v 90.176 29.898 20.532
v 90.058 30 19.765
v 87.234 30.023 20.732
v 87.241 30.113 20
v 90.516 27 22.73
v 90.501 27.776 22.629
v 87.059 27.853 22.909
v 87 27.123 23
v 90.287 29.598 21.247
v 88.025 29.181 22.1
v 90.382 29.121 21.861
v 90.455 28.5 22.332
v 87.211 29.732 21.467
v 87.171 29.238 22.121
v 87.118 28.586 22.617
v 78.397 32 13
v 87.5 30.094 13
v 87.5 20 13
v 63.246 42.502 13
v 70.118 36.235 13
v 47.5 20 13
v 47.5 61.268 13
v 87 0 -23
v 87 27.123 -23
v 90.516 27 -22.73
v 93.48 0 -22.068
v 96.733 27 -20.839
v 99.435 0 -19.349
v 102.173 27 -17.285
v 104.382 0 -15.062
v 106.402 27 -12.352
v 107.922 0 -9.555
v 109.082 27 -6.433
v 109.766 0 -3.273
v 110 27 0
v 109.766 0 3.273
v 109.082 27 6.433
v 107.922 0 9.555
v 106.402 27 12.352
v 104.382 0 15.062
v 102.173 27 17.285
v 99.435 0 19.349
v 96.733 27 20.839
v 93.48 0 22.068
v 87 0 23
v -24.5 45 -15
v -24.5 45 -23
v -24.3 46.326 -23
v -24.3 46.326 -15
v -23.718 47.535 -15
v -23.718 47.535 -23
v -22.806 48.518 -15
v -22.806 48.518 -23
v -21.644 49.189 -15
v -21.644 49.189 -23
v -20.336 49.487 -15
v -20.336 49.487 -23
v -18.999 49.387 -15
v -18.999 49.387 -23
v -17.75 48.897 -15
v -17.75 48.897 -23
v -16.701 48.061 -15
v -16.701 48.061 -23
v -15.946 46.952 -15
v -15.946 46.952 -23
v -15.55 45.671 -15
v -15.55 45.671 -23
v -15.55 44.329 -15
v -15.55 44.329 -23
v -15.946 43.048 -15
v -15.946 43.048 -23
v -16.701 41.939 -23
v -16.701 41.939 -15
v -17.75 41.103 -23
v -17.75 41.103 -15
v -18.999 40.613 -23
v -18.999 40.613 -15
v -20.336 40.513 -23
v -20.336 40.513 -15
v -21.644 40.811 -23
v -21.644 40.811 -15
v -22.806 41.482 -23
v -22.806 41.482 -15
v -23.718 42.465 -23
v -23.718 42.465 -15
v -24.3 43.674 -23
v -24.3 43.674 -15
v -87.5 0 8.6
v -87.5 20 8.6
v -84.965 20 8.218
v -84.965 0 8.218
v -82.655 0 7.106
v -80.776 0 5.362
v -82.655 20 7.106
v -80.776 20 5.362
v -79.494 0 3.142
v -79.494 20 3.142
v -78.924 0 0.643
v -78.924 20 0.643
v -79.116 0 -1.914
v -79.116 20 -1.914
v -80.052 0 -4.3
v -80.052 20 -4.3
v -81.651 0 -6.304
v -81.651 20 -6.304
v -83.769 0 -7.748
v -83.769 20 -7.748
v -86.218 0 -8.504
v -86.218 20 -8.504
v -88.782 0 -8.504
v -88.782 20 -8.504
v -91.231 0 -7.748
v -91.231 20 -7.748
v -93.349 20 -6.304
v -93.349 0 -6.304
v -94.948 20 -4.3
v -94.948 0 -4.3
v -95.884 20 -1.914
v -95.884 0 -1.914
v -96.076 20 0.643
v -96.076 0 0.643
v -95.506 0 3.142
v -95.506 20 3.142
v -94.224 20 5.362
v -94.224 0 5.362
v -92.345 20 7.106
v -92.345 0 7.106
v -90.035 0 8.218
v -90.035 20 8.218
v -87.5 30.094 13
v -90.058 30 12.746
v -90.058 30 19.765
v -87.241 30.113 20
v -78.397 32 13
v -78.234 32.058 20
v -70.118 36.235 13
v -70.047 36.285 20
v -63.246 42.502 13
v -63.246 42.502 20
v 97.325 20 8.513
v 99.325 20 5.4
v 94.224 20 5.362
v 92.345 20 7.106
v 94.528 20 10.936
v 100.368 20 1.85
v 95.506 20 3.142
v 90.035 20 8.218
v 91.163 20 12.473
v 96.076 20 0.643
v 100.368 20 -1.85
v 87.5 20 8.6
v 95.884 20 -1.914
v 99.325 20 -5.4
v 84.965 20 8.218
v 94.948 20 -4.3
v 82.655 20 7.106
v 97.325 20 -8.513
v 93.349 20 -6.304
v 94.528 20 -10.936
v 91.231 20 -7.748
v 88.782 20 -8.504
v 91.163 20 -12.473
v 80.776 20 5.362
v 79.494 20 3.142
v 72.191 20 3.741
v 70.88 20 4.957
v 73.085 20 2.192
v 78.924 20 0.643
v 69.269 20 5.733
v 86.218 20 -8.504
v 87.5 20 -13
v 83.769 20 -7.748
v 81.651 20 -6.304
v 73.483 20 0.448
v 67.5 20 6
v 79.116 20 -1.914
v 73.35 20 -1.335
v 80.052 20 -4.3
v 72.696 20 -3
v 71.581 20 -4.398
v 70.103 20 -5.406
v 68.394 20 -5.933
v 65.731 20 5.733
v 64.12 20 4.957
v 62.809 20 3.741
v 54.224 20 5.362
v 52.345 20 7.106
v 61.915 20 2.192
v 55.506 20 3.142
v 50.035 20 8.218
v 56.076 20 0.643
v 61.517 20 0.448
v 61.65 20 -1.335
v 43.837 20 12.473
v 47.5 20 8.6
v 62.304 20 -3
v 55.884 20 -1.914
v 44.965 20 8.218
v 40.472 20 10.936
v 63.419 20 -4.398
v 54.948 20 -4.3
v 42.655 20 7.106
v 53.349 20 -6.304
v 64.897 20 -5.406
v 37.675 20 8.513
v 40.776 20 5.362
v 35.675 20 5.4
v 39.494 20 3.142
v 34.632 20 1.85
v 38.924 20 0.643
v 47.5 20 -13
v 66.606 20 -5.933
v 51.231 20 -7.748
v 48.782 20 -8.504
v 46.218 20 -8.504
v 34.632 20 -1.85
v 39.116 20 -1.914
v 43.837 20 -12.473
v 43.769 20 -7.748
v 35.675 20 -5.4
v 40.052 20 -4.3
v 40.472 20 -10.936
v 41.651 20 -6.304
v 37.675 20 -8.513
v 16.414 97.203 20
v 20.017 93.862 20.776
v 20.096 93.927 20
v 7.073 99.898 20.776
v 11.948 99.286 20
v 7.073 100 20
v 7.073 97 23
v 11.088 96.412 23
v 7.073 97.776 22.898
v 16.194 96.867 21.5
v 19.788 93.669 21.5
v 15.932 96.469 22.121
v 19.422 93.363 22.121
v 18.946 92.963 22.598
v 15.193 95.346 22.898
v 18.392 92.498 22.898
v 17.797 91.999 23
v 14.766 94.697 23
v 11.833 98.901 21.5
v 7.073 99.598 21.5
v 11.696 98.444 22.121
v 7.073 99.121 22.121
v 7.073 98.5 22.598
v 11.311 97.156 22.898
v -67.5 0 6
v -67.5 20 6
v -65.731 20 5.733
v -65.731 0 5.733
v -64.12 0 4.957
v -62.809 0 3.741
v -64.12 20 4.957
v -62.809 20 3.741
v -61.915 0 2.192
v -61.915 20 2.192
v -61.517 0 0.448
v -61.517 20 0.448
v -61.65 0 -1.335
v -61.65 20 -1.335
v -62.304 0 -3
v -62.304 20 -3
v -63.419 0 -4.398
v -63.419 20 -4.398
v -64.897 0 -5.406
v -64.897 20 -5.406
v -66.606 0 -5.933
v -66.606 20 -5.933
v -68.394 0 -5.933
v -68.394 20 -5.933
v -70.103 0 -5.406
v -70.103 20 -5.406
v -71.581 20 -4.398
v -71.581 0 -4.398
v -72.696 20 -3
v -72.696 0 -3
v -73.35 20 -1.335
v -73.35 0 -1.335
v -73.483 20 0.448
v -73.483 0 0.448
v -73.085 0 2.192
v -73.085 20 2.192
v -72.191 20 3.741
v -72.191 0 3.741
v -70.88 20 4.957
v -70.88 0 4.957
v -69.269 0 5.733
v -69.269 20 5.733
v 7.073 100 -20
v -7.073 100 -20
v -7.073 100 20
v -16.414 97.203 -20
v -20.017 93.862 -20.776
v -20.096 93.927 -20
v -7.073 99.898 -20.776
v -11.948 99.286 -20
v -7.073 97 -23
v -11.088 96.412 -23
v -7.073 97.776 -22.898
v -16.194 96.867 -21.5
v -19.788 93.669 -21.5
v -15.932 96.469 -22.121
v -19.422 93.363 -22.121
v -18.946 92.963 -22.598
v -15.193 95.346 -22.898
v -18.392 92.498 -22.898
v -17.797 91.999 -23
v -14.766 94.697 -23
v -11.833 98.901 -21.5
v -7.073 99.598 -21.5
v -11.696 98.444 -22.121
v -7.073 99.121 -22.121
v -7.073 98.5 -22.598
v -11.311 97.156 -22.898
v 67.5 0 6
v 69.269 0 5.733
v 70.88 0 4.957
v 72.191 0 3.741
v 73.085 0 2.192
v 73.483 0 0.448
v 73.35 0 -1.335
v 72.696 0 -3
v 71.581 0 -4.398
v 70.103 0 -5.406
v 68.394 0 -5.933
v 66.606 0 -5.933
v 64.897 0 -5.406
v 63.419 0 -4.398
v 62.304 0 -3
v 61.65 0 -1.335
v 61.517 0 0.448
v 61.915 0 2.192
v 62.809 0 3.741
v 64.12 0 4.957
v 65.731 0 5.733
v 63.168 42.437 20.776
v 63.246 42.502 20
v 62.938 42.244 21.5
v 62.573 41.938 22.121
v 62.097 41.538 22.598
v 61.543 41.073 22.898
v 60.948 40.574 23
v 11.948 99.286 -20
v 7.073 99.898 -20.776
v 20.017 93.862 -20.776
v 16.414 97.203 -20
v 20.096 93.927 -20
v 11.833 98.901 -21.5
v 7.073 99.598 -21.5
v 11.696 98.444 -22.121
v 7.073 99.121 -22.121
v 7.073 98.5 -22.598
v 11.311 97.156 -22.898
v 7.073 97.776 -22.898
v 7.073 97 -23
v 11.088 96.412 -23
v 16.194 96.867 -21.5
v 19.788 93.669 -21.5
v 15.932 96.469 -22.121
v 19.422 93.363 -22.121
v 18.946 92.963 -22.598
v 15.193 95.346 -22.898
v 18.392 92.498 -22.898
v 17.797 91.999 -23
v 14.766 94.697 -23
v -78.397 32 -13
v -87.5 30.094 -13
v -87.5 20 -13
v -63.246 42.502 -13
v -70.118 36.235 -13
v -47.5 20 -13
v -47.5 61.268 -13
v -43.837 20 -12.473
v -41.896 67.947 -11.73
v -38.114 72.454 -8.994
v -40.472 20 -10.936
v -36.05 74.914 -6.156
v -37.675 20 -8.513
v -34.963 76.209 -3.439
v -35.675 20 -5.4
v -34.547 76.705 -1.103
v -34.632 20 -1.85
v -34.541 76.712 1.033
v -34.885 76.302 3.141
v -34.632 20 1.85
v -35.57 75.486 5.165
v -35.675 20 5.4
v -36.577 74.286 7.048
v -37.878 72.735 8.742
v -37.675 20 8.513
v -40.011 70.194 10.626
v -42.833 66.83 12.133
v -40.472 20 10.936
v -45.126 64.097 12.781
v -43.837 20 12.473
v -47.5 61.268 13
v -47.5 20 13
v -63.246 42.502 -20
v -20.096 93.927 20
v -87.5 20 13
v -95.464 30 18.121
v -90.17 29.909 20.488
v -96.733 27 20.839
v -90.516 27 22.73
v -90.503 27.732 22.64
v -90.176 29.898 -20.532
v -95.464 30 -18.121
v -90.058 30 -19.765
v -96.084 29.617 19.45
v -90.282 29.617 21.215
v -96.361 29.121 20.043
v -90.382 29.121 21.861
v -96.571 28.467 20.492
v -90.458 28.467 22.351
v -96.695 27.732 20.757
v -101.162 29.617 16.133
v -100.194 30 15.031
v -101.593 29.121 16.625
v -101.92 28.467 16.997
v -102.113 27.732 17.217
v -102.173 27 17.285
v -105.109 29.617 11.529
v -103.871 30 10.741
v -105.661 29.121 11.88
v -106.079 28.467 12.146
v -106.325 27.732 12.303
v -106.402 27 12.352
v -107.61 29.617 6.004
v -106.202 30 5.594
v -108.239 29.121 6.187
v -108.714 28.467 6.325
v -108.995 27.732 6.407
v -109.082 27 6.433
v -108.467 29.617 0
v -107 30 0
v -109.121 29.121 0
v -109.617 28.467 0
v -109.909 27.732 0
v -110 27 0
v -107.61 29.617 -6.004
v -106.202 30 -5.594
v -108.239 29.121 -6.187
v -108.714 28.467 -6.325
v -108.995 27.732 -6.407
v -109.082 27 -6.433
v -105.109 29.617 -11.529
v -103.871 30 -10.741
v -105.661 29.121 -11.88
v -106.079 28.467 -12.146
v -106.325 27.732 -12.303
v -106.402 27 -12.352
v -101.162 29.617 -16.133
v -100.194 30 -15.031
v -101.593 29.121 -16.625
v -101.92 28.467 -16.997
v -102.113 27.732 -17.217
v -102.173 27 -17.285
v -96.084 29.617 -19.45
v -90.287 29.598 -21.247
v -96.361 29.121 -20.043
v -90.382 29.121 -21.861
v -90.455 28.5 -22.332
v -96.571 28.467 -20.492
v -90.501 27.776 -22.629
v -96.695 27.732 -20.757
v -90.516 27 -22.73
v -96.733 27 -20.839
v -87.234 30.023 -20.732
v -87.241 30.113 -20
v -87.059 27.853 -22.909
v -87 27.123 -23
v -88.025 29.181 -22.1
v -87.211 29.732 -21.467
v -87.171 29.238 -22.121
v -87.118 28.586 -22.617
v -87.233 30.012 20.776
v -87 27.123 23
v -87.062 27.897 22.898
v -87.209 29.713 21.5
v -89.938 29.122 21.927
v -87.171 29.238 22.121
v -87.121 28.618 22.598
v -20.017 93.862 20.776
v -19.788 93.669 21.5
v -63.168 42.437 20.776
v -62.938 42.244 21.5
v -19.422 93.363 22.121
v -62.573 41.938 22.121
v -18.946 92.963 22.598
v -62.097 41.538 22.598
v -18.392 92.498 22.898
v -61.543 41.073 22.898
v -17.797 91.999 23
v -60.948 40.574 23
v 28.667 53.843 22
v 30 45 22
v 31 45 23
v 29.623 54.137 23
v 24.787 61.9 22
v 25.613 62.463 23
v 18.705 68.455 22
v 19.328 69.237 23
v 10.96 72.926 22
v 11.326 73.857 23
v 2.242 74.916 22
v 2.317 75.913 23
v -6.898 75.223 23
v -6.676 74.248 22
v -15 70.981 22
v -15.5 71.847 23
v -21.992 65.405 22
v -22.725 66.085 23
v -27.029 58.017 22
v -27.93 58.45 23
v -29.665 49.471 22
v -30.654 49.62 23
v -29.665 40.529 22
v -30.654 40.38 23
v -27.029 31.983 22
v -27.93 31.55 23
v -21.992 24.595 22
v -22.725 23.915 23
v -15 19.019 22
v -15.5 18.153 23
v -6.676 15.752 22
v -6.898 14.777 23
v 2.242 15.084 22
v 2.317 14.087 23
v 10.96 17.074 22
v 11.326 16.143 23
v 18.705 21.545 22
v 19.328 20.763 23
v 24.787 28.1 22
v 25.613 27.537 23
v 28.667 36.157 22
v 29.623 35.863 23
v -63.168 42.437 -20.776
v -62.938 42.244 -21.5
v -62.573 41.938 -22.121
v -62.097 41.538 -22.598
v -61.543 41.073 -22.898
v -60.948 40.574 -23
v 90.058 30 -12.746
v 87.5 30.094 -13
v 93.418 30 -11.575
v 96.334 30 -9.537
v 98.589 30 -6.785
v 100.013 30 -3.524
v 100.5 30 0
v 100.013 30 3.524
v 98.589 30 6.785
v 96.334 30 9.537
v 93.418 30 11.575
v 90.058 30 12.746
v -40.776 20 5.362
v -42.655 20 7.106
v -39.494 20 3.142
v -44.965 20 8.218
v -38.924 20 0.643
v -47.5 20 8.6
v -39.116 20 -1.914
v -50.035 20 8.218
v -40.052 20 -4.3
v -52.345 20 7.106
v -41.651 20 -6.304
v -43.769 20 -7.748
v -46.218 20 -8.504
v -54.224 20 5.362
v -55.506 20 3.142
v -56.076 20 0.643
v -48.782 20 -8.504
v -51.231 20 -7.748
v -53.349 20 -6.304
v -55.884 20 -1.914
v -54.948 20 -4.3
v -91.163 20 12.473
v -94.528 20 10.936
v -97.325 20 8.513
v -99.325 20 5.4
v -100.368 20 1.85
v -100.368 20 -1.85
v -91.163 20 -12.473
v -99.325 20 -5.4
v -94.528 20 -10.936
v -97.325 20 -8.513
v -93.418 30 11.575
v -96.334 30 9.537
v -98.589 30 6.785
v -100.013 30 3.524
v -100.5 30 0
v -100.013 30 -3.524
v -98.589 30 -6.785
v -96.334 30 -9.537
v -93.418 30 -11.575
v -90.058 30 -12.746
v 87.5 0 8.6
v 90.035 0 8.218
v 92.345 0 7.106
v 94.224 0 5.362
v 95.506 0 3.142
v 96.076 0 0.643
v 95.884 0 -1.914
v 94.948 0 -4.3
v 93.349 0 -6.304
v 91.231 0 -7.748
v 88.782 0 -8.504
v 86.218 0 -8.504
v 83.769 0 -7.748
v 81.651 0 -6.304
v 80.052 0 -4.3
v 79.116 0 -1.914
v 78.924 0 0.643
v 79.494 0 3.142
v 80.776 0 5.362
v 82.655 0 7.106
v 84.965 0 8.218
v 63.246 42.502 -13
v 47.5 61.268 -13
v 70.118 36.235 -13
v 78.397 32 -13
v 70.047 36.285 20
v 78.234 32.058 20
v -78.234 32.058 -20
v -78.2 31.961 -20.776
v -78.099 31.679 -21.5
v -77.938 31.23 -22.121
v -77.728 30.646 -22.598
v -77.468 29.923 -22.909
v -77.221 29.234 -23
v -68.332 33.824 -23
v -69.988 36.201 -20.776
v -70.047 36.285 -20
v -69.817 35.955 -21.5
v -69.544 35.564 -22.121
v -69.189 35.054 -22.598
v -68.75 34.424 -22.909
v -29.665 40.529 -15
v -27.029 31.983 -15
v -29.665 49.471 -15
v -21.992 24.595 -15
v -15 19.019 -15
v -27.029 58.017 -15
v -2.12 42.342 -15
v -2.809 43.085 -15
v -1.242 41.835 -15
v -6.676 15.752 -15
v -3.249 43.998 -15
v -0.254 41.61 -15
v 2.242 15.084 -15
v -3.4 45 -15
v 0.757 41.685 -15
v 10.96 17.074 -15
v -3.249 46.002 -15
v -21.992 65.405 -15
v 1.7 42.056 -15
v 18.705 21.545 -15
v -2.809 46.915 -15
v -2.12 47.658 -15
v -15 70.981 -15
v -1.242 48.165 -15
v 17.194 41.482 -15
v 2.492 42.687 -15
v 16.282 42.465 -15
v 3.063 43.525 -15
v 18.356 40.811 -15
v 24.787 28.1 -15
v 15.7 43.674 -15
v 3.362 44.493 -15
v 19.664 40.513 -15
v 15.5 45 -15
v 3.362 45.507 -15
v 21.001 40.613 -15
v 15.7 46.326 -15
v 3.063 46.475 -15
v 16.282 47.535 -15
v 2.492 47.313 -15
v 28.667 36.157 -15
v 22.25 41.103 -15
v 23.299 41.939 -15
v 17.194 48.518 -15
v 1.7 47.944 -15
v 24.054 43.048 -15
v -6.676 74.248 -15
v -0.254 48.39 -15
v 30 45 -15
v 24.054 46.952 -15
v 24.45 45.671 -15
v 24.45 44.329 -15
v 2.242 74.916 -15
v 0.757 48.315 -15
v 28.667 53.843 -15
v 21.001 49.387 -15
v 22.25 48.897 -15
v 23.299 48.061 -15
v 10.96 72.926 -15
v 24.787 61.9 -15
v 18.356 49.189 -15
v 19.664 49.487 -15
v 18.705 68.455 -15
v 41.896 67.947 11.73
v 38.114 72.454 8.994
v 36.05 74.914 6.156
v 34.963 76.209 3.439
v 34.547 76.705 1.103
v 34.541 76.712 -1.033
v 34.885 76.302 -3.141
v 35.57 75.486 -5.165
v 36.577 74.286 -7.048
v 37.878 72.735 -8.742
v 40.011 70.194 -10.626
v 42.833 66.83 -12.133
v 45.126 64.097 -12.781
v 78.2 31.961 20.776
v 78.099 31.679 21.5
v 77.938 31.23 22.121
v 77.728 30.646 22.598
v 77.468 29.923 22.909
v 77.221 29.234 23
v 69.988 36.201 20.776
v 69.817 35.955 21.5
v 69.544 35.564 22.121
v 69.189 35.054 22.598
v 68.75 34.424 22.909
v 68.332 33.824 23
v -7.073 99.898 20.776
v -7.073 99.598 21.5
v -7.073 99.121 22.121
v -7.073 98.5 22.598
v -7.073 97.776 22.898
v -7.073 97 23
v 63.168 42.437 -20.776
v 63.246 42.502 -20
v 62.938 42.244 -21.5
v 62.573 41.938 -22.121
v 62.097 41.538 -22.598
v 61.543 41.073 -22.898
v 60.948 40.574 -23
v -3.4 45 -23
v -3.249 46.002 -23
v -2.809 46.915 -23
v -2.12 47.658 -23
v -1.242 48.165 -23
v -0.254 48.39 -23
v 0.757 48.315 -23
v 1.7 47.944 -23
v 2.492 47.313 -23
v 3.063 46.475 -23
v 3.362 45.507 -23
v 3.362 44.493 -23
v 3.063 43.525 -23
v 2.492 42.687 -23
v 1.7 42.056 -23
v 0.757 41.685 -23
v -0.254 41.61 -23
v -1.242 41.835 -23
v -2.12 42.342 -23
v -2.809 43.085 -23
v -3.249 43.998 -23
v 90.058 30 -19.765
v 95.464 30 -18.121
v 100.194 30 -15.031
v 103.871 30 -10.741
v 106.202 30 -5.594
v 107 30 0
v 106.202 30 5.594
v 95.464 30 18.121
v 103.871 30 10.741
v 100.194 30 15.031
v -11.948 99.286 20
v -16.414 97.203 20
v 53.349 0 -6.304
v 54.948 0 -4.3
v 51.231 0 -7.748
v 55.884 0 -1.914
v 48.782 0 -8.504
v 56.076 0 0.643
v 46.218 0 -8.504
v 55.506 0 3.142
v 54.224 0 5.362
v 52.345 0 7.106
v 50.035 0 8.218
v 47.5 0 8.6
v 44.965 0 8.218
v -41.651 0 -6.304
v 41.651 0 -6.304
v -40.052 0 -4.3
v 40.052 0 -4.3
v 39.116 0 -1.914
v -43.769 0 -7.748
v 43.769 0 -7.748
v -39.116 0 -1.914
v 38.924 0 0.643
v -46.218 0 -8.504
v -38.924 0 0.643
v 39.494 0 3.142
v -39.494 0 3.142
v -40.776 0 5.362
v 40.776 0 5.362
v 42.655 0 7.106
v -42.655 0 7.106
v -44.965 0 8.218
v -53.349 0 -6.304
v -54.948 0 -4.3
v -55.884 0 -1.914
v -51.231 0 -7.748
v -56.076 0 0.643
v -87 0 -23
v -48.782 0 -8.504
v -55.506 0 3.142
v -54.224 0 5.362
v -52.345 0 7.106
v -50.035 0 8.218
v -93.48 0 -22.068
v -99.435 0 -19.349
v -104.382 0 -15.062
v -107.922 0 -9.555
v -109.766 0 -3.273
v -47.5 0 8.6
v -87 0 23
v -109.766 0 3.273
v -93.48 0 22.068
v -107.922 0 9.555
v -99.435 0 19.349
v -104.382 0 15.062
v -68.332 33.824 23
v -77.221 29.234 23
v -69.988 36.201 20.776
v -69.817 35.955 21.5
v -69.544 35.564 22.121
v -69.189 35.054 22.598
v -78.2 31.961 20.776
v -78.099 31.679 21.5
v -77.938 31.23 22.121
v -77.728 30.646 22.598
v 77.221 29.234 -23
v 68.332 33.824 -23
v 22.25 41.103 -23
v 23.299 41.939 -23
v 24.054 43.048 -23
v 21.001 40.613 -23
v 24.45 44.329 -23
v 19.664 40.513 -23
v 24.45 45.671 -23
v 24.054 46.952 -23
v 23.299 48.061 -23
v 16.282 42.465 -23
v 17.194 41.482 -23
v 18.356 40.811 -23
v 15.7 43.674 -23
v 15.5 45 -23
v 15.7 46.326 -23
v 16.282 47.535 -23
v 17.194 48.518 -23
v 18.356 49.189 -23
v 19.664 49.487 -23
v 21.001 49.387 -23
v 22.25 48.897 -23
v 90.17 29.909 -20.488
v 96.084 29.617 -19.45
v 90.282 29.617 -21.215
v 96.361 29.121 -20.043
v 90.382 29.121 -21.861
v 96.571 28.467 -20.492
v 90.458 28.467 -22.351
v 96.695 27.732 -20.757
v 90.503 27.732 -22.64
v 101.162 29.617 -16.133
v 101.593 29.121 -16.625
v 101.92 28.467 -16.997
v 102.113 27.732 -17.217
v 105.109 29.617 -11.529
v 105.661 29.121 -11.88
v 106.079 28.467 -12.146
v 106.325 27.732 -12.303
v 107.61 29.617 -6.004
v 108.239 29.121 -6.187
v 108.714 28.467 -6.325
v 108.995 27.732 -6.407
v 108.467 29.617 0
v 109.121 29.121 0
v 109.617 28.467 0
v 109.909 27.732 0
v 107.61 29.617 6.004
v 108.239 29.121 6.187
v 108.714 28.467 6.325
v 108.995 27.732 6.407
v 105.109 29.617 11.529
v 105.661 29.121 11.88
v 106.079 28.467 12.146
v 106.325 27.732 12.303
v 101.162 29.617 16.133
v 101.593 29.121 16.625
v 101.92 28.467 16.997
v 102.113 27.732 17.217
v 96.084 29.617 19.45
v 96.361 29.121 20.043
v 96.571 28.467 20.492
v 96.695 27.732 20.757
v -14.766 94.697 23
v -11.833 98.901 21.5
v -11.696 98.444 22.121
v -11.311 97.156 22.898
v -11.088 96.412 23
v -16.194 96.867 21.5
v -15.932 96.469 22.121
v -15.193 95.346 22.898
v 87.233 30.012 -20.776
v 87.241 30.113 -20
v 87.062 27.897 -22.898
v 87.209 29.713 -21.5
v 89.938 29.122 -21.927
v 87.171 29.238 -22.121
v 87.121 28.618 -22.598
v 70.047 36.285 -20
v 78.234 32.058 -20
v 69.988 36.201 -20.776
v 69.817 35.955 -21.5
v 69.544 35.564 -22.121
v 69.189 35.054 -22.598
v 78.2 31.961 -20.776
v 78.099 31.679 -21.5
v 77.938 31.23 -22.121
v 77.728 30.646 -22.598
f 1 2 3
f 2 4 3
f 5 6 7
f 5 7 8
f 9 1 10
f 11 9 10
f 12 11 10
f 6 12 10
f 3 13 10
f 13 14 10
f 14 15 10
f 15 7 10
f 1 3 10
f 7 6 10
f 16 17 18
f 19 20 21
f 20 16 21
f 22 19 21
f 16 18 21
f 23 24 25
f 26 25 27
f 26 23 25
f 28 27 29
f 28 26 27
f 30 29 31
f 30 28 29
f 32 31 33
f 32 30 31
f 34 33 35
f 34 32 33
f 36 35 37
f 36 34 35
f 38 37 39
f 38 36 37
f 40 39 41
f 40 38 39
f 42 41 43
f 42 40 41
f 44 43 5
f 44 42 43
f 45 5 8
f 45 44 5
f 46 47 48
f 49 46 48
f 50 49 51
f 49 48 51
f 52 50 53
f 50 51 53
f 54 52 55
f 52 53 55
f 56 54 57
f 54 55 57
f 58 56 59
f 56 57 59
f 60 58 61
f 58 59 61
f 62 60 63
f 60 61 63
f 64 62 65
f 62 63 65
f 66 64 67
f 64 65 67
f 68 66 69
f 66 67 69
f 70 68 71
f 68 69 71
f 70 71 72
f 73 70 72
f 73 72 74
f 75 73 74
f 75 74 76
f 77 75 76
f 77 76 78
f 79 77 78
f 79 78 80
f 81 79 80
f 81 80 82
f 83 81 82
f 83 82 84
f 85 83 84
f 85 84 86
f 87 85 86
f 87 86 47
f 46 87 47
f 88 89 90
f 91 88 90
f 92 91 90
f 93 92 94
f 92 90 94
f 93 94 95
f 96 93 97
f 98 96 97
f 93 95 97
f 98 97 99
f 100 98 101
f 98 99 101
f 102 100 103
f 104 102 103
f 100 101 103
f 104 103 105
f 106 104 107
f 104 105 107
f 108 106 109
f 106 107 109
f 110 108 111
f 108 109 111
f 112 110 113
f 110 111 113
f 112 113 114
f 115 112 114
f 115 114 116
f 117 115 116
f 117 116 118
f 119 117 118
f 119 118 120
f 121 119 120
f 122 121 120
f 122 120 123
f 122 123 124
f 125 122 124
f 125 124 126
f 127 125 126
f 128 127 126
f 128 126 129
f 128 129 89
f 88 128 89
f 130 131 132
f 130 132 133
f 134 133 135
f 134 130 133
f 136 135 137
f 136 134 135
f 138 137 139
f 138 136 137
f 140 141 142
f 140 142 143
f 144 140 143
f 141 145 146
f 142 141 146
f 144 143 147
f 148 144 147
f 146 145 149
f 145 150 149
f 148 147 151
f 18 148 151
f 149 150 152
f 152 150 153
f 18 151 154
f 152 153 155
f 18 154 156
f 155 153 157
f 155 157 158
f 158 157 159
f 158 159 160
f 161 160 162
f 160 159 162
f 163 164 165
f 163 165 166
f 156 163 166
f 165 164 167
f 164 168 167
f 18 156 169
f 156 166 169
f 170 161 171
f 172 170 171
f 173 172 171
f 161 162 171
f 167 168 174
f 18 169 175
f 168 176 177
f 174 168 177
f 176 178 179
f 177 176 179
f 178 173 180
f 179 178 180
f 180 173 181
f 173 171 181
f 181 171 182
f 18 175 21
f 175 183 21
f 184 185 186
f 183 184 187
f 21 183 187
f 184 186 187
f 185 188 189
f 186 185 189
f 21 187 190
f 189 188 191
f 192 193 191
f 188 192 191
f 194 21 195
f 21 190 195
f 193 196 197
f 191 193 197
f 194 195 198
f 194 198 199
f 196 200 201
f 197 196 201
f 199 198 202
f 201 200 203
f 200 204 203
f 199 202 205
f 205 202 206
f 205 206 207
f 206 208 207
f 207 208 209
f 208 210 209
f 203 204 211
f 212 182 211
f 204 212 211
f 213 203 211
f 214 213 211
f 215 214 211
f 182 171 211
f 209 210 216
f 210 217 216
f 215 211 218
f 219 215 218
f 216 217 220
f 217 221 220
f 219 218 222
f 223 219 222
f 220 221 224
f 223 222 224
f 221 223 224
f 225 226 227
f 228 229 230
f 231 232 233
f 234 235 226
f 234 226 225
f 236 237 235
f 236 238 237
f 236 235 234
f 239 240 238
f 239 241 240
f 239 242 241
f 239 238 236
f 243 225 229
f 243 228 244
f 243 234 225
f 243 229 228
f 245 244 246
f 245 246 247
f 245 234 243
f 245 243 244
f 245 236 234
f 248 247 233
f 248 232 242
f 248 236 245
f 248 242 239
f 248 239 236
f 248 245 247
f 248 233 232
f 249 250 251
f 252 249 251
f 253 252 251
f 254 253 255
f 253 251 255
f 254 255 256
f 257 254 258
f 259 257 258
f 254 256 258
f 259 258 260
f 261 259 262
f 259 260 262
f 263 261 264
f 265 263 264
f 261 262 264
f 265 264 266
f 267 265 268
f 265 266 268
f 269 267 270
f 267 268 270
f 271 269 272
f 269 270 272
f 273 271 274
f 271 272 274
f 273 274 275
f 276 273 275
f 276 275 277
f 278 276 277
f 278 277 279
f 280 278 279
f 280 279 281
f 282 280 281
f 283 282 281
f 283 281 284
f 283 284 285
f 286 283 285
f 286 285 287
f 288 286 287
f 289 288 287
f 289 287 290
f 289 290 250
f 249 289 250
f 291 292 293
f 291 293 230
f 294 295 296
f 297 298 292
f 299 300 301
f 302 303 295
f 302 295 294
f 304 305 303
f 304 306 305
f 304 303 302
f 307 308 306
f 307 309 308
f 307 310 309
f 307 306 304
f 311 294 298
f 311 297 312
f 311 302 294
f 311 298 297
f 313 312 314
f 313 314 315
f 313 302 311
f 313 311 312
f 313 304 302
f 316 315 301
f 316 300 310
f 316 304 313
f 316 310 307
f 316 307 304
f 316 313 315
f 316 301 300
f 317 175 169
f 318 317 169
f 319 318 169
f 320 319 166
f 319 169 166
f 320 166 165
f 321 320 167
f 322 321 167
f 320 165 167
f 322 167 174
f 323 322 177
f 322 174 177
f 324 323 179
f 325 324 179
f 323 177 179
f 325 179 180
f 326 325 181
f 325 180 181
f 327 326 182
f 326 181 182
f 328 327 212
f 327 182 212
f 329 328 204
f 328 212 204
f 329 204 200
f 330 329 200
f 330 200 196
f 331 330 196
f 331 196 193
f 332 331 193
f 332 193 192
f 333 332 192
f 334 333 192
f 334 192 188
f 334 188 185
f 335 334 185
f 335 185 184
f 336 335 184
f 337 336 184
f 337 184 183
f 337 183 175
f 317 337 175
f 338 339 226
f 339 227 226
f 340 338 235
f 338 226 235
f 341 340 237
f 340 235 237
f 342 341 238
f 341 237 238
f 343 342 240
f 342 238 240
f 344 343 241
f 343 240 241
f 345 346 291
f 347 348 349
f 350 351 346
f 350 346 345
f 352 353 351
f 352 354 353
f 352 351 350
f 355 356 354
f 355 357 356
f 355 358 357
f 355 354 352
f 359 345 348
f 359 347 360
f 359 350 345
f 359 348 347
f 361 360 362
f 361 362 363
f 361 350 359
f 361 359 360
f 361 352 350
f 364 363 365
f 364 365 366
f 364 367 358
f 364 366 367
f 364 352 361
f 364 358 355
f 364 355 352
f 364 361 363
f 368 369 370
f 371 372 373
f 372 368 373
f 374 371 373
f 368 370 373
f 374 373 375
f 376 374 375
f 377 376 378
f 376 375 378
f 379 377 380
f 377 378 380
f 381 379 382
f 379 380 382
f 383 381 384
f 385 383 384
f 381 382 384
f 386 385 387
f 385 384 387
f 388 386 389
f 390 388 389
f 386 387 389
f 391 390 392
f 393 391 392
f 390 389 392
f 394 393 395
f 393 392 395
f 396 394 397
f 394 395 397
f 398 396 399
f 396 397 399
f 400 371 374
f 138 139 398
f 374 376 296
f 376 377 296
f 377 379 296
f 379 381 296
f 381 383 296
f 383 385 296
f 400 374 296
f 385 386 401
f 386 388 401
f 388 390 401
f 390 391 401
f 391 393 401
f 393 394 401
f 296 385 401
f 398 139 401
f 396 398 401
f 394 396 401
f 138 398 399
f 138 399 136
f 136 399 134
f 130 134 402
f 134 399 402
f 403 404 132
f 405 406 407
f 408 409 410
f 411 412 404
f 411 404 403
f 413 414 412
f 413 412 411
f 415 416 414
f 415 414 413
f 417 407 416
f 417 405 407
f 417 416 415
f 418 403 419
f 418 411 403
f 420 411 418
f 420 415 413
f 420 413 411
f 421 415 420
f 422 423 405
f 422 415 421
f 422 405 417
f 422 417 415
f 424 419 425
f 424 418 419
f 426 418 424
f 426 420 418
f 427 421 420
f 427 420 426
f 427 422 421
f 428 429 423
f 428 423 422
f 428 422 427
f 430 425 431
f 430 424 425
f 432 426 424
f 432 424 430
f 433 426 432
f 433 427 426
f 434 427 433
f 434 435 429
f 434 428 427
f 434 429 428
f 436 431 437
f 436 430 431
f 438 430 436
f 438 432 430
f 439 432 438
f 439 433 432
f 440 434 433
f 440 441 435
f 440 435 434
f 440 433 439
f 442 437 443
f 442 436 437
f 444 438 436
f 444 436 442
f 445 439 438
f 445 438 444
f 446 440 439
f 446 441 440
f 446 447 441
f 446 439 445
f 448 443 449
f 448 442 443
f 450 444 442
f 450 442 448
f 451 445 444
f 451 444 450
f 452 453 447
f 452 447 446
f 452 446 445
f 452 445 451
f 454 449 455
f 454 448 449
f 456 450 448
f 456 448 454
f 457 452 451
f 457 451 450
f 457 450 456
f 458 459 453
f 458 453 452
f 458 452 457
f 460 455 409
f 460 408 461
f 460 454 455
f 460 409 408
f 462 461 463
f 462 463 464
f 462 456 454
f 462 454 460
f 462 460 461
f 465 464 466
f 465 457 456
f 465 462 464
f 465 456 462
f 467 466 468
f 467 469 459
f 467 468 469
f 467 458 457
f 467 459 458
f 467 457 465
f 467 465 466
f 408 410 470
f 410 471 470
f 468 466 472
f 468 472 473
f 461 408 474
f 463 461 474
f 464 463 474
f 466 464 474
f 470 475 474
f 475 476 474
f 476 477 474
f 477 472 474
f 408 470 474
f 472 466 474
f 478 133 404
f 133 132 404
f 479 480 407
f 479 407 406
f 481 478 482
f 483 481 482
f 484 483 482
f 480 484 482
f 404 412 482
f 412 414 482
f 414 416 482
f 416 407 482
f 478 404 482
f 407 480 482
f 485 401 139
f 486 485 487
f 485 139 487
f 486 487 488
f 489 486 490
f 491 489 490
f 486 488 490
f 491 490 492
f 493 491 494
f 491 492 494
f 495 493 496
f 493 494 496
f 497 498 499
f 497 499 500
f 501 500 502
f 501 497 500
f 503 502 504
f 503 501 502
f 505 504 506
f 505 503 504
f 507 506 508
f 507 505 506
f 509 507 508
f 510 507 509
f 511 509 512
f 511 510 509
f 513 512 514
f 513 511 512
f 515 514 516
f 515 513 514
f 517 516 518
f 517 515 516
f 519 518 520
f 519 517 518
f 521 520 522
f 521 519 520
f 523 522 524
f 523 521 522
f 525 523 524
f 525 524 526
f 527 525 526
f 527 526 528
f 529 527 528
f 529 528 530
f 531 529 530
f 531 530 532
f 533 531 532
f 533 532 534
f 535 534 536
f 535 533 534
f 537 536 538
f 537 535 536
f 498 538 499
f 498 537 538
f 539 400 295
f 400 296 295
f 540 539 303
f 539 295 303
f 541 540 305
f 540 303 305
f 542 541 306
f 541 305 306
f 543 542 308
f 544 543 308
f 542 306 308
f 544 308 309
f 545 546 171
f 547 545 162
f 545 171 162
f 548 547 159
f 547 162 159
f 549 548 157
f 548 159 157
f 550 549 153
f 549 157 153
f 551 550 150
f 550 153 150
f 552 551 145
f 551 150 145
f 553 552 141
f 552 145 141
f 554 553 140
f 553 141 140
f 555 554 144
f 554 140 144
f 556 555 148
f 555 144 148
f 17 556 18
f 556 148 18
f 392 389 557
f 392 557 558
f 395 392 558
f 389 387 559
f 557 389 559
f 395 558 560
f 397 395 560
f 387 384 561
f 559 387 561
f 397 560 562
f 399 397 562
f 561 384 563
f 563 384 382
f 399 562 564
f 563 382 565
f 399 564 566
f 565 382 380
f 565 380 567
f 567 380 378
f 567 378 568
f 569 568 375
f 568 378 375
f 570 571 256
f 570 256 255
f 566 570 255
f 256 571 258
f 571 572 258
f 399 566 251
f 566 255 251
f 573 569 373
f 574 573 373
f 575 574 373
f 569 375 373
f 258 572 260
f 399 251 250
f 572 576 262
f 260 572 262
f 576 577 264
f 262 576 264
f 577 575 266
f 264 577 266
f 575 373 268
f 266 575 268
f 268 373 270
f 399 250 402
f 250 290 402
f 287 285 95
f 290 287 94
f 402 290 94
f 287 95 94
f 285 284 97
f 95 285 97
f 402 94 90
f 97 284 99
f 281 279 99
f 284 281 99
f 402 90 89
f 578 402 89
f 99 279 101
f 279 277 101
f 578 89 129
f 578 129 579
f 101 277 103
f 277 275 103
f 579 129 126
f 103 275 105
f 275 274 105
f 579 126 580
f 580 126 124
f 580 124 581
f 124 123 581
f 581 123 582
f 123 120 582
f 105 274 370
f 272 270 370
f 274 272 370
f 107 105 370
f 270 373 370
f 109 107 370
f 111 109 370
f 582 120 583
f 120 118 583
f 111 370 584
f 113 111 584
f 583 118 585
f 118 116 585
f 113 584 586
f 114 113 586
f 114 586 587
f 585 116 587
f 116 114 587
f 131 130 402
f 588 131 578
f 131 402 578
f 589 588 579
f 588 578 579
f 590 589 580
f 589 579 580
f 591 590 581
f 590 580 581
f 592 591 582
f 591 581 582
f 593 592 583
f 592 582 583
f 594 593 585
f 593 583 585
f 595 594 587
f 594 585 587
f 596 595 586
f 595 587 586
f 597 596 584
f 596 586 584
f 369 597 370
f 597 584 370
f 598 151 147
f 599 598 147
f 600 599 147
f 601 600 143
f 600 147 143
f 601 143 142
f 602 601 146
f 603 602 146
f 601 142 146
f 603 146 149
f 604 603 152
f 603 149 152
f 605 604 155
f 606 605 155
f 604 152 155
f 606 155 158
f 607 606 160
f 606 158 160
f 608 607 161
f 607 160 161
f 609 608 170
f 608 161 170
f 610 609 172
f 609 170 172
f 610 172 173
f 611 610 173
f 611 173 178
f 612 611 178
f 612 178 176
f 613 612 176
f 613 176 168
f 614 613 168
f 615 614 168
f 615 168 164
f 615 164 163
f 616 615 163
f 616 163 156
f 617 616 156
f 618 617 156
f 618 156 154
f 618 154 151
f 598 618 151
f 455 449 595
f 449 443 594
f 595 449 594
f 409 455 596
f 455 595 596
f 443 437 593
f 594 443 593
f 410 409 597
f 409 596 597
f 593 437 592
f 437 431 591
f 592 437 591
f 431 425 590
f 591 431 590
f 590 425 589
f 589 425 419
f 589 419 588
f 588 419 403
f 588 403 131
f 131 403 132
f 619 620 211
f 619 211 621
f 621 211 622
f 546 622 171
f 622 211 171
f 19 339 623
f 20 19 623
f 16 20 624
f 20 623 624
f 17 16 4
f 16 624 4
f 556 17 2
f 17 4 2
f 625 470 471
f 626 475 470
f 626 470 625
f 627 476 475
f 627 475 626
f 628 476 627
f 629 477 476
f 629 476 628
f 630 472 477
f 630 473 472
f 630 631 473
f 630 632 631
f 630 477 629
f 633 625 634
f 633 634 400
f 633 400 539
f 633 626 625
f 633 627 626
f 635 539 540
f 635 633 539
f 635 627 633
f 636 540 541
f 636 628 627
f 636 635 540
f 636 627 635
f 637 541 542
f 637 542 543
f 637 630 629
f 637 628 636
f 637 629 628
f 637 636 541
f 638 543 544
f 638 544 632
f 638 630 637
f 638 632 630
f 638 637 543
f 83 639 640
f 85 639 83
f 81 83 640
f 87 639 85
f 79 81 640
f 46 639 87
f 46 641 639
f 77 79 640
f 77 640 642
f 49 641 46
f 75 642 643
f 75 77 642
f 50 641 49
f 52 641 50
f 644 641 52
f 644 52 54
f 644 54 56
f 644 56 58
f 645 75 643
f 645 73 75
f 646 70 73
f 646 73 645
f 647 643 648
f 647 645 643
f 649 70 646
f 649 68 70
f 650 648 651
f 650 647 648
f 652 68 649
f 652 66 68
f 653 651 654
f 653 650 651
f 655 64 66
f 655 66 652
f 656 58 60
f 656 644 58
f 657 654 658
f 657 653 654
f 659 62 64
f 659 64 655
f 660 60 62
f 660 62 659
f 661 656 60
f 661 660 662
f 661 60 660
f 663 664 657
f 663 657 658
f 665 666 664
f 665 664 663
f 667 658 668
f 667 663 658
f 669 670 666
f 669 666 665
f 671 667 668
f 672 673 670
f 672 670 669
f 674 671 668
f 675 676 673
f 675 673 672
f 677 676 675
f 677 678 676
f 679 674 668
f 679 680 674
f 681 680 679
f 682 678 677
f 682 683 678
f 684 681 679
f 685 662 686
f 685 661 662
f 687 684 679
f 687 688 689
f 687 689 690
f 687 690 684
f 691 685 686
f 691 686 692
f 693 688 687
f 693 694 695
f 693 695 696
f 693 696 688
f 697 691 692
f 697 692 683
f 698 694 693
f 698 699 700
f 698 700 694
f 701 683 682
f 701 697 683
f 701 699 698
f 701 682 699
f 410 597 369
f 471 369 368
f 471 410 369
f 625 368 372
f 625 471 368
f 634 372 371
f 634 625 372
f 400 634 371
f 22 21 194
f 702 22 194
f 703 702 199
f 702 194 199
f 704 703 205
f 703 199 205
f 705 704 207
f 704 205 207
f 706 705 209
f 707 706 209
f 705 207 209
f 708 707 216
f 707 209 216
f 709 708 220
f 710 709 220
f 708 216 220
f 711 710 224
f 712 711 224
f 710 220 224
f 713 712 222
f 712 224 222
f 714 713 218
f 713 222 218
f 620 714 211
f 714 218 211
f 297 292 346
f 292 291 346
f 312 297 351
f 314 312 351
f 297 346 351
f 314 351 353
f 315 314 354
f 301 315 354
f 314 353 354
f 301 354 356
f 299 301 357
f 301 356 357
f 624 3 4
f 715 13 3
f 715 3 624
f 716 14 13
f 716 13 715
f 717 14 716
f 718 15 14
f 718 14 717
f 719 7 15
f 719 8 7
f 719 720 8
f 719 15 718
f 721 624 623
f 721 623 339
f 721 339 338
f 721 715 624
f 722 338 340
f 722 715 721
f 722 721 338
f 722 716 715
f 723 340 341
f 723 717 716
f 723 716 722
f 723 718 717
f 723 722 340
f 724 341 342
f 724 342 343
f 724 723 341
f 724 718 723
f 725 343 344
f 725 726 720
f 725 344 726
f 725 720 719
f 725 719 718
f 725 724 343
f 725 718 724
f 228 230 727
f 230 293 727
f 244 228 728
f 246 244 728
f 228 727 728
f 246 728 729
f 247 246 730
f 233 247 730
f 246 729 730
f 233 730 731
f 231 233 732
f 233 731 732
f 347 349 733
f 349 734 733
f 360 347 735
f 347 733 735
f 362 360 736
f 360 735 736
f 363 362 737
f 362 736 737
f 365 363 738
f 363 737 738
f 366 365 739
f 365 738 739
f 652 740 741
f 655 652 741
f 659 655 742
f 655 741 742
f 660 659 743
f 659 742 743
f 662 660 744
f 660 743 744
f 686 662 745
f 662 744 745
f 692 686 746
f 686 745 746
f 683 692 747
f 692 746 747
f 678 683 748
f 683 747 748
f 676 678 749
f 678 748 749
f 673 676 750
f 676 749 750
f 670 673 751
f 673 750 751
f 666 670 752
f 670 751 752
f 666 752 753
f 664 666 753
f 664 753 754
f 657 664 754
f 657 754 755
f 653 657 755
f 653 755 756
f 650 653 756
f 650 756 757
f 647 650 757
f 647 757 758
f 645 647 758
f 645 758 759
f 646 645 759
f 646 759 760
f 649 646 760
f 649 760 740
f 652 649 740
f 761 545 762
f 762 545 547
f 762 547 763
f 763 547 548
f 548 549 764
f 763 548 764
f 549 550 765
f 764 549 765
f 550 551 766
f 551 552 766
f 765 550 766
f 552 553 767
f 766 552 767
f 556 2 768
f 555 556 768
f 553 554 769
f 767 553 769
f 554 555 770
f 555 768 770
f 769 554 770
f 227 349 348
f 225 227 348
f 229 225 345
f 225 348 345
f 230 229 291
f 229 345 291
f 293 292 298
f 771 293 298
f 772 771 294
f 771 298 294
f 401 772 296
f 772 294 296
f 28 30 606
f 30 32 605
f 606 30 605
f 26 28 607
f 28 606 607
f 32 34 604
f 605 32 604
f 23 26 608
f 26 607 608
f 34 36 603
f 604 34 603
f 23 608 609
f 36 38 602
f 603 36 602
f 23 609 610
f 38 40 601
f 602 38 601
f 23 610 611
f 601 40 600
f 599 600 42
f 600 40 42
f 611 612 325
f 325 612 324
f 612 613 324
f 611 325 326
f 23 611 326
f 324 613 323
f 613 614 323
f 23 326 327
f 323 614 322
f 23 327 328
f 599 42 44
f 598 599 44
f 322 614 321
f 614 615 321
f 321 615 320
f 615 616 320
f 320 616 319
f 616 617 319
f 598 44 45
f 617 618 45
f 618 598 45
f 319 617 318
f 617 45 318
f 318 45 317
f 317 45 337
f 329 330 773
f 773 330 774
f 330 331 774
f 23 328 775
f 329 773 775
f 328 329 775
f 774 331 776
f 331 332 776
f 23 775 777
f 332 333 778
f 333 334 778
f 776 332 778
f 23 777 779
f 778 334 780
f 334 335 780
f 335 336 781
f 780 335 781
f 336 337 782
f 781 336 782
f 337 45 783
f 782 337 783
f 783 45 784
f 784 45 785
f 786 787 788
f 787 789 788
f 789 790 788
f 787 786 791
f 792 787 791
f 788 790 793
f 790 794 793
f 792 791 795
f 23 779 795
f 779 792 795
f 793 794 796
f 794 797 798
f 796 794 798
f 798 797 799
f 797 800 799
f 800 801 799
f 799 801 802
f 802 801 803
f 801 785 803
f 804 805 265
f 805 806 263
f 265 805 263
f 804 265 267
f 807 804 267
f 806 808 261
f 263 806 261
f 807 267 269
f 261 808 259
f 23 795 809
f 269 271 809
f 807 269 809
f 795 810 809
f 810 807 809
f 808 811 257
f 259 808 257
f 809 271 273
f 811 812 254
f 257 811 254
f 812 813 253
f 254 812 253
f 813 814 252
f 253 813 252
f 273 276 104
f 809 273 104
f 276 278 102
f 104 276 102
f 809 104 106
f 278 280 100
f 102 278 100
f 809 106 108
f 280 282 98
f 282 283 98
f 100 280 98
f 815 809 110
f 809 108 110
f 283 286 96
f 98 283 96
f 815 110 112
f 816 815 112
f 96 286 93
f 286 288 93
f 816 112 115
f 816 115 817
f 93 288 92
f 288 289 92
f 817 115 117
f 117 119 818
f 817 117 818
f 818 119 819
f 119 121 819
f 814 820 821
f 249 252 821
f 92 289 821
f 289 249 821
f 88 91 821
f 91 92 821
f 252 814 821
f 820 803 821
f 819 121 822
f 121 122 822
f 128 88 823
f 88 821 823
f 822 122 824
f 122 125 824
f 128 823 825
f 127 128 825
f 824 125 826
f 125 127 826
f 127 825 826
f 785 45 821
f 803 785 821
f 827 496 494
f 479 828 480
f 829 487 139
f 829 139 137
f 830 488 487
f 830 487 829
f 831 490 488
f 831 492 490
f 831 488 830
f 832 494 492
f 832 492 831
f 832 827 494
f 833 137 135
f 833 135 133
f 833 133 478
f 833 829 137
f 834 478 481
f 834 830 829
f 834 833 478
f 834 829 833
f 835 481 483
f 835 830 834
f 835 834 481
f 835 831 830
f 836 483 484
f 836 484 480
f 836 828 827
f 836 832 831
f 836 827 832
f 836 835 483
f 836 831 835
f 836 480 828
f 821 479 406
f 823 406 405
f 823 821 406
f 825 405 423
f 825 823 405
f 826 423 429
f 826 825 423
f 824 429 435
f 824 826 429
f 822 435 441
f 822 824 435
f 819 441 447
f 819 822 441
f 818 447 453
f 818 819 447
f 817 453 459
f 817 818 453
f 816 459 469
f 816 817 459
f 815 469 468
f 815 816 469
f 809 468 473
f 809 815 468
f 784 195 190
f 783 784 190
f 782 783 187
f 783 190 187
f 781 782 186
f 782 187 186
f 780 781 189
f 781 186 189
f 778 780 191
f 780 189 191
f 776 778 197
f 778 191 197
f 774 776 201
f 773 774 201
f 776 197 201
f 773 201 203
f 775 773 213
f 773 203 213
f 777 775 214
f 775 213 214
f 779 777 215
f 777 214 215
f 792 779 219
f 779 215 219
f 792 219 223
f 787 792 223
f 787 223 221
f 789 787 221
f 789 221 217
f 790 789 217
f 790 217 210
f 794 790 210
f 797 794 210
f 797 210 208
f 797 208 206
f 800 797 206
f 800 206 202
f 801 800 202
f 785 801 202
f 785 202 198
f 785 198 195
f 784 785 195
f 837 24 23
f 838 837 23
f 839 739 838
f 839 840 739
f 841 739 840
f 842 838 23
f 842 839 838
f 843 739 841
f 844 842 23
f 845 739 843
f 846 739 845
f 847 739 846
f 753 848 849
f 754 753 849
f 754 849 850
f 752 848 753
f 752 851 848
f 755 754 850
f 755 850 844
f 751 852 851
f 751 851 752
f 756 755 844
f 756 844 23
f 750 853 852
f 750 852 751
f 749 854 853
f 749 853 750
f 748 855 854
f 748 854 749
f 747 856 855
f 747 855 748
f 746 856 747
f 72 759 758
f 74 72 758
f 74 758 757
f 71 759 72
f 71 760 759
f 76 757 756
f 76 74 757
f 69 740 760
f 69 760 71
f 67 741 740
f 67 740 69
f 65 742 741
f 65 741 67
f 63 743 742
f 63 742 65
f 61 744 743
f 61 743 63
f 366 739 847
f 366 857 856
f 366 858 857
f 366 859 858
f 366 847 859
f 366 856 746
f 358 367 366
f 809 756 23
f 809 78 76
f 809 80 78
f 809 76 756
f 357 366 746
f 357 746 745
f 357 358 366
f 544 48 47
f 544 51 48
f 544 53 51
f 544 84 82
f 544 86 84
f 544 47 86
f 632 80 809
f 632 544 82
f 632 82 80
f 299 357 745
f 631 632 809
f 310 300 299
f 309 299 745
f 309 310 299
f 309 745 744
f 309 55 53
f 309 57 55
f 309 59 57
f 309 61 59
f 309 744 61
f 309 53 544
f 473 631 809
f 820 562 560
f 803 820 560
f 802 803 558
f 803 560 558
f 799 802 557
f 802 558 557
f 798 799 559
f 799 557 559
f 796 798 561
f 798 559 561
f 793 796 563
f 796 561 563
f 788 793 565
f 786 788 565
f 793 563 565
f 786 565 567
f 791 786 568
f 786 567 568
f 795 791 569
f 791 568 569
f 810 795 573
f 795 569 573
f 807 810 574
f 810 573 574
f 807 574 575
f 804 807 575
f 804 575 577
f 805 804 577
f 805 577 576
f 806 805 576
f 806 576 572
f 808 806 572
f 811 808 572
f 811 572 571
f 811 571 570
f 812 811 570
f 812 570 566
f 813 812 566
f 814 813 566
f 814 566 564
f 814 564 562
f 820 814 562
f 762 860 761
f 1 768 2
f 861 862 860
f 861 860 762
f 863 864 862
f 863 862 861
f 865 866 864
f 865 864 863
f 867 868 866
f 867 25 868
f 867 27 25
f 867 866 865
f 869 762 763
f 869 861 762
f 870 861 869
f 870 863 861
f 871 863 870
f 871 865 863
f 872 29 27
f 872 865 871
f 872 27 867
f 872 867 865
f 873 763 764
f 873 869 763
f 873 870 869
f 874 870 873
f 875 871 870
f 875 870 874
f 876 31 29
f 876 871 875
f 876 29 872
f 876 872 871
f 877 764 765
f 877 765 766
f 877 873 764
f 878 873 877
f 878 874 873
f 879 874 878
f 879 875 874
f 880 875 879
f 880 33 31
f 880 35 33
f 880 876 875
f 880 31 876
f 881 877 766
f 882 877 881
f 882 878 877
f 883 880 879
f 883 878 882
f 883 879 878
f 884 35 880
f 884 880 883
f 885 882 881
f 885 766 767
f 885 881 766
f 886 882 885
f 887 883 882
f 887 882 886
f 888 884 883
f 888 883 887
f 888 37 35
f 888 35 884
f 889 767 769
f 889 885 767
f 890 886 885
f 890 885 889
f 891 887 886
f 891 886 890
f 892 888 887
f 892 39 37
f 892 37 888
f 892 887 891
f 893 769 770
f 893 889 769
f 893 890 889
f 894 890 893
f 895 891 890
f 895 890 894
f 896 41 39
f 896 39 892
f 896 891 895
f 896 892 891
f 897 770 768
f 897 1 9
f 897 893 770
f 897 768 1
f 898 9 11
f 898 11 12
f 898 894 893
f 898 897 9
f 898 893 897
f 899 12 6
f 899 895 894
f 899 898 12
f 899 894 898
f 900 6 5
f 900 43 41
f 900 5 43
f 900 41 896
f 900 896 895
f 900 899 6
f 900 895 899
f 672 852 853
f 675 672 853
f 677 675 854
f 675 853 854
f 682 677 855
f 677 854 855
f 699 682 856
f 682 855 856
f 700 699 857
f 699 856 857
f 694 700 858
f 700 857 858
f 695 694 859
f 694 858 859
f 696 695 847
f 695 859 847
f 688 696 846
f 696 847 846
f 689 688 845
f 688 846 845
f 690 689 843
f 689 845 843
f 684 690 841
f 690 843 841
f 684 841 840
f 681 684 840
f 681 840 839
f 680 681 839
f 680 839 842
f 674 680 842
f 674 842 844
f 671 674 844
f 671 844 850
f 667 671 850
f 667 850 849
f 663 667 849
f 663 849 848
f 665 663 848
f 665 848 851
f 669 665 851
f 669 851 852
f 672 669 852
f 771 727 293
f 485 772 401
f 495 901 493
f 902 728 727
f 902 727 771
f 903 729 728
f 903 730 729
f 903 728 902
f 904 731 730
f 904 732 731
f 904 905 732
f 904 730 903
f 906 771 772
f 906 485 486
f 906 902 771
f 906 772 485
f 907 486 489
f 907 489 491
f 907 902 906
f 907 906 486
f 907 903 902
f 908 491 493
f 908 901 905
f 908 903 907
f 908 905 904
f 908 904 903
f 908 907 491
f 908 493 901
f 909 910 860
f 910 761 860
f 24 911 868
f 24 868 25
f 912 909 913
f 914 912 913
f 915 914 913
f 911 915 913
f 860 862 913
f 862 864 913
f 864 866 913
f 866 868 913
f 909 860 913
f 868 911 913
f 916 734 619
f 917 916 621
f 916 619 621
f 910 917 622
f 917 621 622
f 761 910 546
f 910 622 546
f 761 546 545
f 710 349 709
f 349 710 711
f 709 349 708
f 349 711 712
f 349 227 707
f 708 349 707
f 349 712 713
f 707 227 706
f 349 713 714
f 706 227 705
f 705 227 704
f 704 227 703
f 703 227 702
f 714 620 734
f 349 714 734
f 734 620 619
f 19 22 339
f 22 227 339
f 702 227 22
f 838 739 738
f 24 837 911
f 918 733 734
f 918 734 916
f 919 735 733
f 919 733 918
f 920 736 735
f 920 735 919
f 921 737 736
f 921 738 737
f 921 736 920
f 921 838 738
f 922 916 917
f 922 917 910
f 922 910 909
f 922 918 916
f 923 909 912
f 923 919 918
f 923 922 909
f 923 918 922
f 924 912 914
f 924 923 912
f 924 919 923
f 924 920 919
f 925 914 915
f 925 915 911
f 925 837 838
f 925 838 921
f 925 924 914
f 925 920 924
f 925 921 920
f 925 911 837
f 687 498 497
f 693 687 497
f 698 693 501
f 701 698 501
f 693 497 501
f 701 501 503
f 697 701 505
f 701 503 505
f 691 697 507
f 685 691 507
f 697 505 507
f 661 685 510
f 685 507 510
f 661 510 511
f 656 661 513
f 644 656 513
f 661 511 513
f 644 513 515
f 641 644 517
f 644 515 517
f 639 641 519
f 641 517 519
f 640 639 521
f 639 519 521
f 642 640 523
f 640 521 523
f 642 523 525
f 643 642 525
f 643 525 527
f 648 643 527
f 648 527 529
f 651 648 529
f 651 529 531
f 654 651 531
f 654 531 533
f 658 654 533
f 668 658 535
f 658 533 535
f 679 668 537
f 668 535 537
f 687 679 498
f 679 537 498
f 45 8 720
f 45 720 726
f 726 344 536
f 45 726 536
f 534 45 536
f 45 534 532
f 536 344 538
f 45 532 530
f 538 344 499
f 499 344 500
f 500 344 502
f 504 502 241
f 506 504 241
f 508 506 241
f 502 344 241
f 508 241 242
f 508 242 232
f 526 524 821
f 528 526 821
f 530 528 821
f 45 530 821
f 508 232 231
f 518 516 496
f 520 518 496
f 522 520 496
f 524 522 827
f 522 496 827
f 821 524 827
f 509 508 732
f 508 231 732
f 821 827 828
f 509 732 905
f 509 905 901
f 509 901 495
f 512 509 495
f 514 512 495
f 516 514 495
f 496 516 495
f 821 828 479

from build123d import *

# Parameters (mm, degrees)
BOSS_EXTRUDE1_DEPTH = 23
SKETCH2_OUTSIDE_W   = 271.2
SKETCH2_OUTSIDE_H   = 97.2
CUT_EXTRUDE1_DEPTH  = 151.429385427
FILLET1_R           = 35
FILLET2_R           = 17
CUT_EXTRUDE2_START  = 20
CUT_EXTRUDE2_DEPTH  = 131.429385516
SKETCH4_R           = 8.6
SKETCH4_R_2         = 6
CUT_EXTRUDE3_DEPTH  = 138.945641564
SKETCH5_R           = 30
CUT_EXTRUDE4_DEPTH  = 38
SKETCH6_R           = 4.5
SKETCH6_R_2         = 3.4
CUT_EXTRUDE5_DEPTH  = 156.614909412
CHAMFER1_SIZE       = 1
FILLET3_R           = 3


with BuildPart() as part:
    # Sketch1 → Boss-Extrude1 (new, symmetric)
    with BuildSketch(Plane.XY):
        Polygon((110, 0), (-110, 0), (-110, 30), (-73.736974182, 30), (-15, 100), (15, 100), (73.736974182, 30), (110, 30), align=None)
    extrude(amount=BOSS_EXTRUDE1_DEPTH, both=True)

    # Sketch2 outside → Cut-Extrude1 (cut, through all)
    with BuildSketch(Plane(origin=(0, 0, 0), x_dir=(1, 0, 0), z_dir=(0, 1, 0))):
        Rectangle(SKETCH2_OUTSIDE_W, SKETCH2_OUTSIDE_H)
        with BuildLine():
            Line((87, -23), (-87, -23))
            ThreePointArc((-87, -23), (-110, 0), (-87, 23))
            Line((-87, 23), (87, 23))
            ThreePointArc((87, 23), (110, 0), (87, -23))
        make_face(mode=Mode.SUBTRACT)
    extrude(amount=CUT_EXTRUDE1_DEPTH, mode=Mode.SUBTRACT)

    # Fillet1
    fillet1_edges = [part.edges().sort_by_distance(p)[0] for p in [
        (73.736974182, 30, 0),
        (-73.736974182, 30, 0),
    ]]
    fillet(fillet1_edges, radius=FILLET1_R)

    # Fillet2
    fillet2_edges = [part.edges().sort_by_distance(p)[0] for p in [
        (-15, 100, 0),
        (15, 100, 0),
    ]]
    fillet(fillet2_edges, radius=FILLET2_R)

    # Sketch3 → Cut-Extrude2 (cut, through all)
    with BuildSketch(Plane(origin=(0, 0, 0), x_dir=(1, 0, 0), z_dir=(0, 1, 0)).offset(CUT_EXTRUDE2_START)):
        with BuildLine():
            Line((-87.5, 13), (-47.5, 13))
            ThreePointArc((-47.5, 13), (-34.5, 0), (-47.5, -13))
            Line((-47.5, -13), (-87.5, -13))
            ThreePointArc((-87.5, -13), (-100.5, 0), (-87.5, 13))
        make_face()
        with BuildLine():
            Line((87.5, -13), (47.5, -13))
            ThreePointArc((47.5, -13), (34.5, 0), (47.5, 13))
            Line((47.5, 13), (87.5, 13))
            ThreePointArc((87.5, 13), (100.5, 0), (87.5, -13))
        make_face()
    extrude(amount=CUT_EXTRUDE2_DEPTH, mode=Mode.SUBTRACT)

    # Sketch4 → Cut-Extrude3 (cut, through all)
    with BuildSketch(Plane(origin=(0, 20, 0), x_dir=(1, 0, 0), z_dir=(0, 1, 0))):
        with Locations(Location((-87.5, 0, 0), (0, 0, 270))):
            Circle(SKETCH4_R)
        with Locations(Location((-47.5, 0, 0), (0, 0, 270))):
            Circle(SKETCH4_R)
        with Locations(Location((47.5, 0, 0), (0, 0, 270))):
            Circle(SKETCH4_R)
        with Locations(Location((87.5, 0, 0), (0, 0, 270))):
            Circle(SKETCH4_R)
        with Locations(Location((67.5, 0, 0), (0, 0, 270))):
            Circle(SKETCH4_R_2)
        with Locations(Location((-67.5, 0, 0), (0, 0, 270))):
            Circle(SKETCH4_R_2)
    extrude(amount=-CUT_EXTRUDE3_DEPTH, mode=Mode.SUBTRACT)

    # Sketch5 → Cut-Extrude4 (cut)
    with BuildSketch(Plane.XY.offset(23)):
        with Locations((0, 45)):
            Circle(SKETCH5_R)
    extrude(amount=-CUT_EXTRUDE4_DEPTH, mode=Mode.SUBTRACT)

    # Sketch6 → Cut-Extrude5 (cut, through all)
    with BuildSketch(Plane(origin=(0, 0, -23), x_dir=(-1, 0, 0), z_dir=(0, 0, -1))):
        with Locations((20, 45)):
            Circle(SKETCH6_R)
        with Locations((-20, 45)):
            Circle(SKETCH6_R)
        with Locations((0, 45)):
            Circle(SKETCH6_R_2)
    extrude(amount=-CUT_EXTRUDE5_DEPTH, mode=Mode.SUBTRACT)

    # Chamfer1
    chamfer1_edges = [part.edges().sort_by_distance(p)[0] for p in [
        (-30, 45, 23),
    ]]
    chamfer(chamfer1_edges, length=CHAMFER1_SIZE)

    # Fillet3
    fillet3_edges = [part.edges().sort_by_distance(p)[0] for p in [
        (41.670856027, 68.214911513, -23),
        (41.670856027, 68.214911513, 23),
        (110, 30, 0),
        (-110, 30, 0),
        (73.893294765, 33.95631081, -23),
        (88.530811729, 30.033323245, -22.949000314),
        (88.530811729, 30.033323245, 22.949000314),
        (73.893294765, 33.95631081, 23),
        (-88.530811729, 30.033323245, -22.949000314),
        (-73.893294765, 33.95631081, -23),
        (-73.893294765, 33.95631081, 23),
        (-88.530811729, 30.033323245, 22.949000314),
        (0, 100, -23),
        (0, 100, 23),
        (-41.670856027, 68.214911513, -23),
        (-14.257280261, 98.40723238, -23),
        (14.257280261, 98.40723238, -23),
        (-41.670856027, 68.214911513, 23),
        (-14.257280261, 98.40723238, 23),
        (14.257280261, 98.40723238, 23),
    ]]
    fillet(fillet3_edges, radius=FILLET3_R)


solid = part.part
